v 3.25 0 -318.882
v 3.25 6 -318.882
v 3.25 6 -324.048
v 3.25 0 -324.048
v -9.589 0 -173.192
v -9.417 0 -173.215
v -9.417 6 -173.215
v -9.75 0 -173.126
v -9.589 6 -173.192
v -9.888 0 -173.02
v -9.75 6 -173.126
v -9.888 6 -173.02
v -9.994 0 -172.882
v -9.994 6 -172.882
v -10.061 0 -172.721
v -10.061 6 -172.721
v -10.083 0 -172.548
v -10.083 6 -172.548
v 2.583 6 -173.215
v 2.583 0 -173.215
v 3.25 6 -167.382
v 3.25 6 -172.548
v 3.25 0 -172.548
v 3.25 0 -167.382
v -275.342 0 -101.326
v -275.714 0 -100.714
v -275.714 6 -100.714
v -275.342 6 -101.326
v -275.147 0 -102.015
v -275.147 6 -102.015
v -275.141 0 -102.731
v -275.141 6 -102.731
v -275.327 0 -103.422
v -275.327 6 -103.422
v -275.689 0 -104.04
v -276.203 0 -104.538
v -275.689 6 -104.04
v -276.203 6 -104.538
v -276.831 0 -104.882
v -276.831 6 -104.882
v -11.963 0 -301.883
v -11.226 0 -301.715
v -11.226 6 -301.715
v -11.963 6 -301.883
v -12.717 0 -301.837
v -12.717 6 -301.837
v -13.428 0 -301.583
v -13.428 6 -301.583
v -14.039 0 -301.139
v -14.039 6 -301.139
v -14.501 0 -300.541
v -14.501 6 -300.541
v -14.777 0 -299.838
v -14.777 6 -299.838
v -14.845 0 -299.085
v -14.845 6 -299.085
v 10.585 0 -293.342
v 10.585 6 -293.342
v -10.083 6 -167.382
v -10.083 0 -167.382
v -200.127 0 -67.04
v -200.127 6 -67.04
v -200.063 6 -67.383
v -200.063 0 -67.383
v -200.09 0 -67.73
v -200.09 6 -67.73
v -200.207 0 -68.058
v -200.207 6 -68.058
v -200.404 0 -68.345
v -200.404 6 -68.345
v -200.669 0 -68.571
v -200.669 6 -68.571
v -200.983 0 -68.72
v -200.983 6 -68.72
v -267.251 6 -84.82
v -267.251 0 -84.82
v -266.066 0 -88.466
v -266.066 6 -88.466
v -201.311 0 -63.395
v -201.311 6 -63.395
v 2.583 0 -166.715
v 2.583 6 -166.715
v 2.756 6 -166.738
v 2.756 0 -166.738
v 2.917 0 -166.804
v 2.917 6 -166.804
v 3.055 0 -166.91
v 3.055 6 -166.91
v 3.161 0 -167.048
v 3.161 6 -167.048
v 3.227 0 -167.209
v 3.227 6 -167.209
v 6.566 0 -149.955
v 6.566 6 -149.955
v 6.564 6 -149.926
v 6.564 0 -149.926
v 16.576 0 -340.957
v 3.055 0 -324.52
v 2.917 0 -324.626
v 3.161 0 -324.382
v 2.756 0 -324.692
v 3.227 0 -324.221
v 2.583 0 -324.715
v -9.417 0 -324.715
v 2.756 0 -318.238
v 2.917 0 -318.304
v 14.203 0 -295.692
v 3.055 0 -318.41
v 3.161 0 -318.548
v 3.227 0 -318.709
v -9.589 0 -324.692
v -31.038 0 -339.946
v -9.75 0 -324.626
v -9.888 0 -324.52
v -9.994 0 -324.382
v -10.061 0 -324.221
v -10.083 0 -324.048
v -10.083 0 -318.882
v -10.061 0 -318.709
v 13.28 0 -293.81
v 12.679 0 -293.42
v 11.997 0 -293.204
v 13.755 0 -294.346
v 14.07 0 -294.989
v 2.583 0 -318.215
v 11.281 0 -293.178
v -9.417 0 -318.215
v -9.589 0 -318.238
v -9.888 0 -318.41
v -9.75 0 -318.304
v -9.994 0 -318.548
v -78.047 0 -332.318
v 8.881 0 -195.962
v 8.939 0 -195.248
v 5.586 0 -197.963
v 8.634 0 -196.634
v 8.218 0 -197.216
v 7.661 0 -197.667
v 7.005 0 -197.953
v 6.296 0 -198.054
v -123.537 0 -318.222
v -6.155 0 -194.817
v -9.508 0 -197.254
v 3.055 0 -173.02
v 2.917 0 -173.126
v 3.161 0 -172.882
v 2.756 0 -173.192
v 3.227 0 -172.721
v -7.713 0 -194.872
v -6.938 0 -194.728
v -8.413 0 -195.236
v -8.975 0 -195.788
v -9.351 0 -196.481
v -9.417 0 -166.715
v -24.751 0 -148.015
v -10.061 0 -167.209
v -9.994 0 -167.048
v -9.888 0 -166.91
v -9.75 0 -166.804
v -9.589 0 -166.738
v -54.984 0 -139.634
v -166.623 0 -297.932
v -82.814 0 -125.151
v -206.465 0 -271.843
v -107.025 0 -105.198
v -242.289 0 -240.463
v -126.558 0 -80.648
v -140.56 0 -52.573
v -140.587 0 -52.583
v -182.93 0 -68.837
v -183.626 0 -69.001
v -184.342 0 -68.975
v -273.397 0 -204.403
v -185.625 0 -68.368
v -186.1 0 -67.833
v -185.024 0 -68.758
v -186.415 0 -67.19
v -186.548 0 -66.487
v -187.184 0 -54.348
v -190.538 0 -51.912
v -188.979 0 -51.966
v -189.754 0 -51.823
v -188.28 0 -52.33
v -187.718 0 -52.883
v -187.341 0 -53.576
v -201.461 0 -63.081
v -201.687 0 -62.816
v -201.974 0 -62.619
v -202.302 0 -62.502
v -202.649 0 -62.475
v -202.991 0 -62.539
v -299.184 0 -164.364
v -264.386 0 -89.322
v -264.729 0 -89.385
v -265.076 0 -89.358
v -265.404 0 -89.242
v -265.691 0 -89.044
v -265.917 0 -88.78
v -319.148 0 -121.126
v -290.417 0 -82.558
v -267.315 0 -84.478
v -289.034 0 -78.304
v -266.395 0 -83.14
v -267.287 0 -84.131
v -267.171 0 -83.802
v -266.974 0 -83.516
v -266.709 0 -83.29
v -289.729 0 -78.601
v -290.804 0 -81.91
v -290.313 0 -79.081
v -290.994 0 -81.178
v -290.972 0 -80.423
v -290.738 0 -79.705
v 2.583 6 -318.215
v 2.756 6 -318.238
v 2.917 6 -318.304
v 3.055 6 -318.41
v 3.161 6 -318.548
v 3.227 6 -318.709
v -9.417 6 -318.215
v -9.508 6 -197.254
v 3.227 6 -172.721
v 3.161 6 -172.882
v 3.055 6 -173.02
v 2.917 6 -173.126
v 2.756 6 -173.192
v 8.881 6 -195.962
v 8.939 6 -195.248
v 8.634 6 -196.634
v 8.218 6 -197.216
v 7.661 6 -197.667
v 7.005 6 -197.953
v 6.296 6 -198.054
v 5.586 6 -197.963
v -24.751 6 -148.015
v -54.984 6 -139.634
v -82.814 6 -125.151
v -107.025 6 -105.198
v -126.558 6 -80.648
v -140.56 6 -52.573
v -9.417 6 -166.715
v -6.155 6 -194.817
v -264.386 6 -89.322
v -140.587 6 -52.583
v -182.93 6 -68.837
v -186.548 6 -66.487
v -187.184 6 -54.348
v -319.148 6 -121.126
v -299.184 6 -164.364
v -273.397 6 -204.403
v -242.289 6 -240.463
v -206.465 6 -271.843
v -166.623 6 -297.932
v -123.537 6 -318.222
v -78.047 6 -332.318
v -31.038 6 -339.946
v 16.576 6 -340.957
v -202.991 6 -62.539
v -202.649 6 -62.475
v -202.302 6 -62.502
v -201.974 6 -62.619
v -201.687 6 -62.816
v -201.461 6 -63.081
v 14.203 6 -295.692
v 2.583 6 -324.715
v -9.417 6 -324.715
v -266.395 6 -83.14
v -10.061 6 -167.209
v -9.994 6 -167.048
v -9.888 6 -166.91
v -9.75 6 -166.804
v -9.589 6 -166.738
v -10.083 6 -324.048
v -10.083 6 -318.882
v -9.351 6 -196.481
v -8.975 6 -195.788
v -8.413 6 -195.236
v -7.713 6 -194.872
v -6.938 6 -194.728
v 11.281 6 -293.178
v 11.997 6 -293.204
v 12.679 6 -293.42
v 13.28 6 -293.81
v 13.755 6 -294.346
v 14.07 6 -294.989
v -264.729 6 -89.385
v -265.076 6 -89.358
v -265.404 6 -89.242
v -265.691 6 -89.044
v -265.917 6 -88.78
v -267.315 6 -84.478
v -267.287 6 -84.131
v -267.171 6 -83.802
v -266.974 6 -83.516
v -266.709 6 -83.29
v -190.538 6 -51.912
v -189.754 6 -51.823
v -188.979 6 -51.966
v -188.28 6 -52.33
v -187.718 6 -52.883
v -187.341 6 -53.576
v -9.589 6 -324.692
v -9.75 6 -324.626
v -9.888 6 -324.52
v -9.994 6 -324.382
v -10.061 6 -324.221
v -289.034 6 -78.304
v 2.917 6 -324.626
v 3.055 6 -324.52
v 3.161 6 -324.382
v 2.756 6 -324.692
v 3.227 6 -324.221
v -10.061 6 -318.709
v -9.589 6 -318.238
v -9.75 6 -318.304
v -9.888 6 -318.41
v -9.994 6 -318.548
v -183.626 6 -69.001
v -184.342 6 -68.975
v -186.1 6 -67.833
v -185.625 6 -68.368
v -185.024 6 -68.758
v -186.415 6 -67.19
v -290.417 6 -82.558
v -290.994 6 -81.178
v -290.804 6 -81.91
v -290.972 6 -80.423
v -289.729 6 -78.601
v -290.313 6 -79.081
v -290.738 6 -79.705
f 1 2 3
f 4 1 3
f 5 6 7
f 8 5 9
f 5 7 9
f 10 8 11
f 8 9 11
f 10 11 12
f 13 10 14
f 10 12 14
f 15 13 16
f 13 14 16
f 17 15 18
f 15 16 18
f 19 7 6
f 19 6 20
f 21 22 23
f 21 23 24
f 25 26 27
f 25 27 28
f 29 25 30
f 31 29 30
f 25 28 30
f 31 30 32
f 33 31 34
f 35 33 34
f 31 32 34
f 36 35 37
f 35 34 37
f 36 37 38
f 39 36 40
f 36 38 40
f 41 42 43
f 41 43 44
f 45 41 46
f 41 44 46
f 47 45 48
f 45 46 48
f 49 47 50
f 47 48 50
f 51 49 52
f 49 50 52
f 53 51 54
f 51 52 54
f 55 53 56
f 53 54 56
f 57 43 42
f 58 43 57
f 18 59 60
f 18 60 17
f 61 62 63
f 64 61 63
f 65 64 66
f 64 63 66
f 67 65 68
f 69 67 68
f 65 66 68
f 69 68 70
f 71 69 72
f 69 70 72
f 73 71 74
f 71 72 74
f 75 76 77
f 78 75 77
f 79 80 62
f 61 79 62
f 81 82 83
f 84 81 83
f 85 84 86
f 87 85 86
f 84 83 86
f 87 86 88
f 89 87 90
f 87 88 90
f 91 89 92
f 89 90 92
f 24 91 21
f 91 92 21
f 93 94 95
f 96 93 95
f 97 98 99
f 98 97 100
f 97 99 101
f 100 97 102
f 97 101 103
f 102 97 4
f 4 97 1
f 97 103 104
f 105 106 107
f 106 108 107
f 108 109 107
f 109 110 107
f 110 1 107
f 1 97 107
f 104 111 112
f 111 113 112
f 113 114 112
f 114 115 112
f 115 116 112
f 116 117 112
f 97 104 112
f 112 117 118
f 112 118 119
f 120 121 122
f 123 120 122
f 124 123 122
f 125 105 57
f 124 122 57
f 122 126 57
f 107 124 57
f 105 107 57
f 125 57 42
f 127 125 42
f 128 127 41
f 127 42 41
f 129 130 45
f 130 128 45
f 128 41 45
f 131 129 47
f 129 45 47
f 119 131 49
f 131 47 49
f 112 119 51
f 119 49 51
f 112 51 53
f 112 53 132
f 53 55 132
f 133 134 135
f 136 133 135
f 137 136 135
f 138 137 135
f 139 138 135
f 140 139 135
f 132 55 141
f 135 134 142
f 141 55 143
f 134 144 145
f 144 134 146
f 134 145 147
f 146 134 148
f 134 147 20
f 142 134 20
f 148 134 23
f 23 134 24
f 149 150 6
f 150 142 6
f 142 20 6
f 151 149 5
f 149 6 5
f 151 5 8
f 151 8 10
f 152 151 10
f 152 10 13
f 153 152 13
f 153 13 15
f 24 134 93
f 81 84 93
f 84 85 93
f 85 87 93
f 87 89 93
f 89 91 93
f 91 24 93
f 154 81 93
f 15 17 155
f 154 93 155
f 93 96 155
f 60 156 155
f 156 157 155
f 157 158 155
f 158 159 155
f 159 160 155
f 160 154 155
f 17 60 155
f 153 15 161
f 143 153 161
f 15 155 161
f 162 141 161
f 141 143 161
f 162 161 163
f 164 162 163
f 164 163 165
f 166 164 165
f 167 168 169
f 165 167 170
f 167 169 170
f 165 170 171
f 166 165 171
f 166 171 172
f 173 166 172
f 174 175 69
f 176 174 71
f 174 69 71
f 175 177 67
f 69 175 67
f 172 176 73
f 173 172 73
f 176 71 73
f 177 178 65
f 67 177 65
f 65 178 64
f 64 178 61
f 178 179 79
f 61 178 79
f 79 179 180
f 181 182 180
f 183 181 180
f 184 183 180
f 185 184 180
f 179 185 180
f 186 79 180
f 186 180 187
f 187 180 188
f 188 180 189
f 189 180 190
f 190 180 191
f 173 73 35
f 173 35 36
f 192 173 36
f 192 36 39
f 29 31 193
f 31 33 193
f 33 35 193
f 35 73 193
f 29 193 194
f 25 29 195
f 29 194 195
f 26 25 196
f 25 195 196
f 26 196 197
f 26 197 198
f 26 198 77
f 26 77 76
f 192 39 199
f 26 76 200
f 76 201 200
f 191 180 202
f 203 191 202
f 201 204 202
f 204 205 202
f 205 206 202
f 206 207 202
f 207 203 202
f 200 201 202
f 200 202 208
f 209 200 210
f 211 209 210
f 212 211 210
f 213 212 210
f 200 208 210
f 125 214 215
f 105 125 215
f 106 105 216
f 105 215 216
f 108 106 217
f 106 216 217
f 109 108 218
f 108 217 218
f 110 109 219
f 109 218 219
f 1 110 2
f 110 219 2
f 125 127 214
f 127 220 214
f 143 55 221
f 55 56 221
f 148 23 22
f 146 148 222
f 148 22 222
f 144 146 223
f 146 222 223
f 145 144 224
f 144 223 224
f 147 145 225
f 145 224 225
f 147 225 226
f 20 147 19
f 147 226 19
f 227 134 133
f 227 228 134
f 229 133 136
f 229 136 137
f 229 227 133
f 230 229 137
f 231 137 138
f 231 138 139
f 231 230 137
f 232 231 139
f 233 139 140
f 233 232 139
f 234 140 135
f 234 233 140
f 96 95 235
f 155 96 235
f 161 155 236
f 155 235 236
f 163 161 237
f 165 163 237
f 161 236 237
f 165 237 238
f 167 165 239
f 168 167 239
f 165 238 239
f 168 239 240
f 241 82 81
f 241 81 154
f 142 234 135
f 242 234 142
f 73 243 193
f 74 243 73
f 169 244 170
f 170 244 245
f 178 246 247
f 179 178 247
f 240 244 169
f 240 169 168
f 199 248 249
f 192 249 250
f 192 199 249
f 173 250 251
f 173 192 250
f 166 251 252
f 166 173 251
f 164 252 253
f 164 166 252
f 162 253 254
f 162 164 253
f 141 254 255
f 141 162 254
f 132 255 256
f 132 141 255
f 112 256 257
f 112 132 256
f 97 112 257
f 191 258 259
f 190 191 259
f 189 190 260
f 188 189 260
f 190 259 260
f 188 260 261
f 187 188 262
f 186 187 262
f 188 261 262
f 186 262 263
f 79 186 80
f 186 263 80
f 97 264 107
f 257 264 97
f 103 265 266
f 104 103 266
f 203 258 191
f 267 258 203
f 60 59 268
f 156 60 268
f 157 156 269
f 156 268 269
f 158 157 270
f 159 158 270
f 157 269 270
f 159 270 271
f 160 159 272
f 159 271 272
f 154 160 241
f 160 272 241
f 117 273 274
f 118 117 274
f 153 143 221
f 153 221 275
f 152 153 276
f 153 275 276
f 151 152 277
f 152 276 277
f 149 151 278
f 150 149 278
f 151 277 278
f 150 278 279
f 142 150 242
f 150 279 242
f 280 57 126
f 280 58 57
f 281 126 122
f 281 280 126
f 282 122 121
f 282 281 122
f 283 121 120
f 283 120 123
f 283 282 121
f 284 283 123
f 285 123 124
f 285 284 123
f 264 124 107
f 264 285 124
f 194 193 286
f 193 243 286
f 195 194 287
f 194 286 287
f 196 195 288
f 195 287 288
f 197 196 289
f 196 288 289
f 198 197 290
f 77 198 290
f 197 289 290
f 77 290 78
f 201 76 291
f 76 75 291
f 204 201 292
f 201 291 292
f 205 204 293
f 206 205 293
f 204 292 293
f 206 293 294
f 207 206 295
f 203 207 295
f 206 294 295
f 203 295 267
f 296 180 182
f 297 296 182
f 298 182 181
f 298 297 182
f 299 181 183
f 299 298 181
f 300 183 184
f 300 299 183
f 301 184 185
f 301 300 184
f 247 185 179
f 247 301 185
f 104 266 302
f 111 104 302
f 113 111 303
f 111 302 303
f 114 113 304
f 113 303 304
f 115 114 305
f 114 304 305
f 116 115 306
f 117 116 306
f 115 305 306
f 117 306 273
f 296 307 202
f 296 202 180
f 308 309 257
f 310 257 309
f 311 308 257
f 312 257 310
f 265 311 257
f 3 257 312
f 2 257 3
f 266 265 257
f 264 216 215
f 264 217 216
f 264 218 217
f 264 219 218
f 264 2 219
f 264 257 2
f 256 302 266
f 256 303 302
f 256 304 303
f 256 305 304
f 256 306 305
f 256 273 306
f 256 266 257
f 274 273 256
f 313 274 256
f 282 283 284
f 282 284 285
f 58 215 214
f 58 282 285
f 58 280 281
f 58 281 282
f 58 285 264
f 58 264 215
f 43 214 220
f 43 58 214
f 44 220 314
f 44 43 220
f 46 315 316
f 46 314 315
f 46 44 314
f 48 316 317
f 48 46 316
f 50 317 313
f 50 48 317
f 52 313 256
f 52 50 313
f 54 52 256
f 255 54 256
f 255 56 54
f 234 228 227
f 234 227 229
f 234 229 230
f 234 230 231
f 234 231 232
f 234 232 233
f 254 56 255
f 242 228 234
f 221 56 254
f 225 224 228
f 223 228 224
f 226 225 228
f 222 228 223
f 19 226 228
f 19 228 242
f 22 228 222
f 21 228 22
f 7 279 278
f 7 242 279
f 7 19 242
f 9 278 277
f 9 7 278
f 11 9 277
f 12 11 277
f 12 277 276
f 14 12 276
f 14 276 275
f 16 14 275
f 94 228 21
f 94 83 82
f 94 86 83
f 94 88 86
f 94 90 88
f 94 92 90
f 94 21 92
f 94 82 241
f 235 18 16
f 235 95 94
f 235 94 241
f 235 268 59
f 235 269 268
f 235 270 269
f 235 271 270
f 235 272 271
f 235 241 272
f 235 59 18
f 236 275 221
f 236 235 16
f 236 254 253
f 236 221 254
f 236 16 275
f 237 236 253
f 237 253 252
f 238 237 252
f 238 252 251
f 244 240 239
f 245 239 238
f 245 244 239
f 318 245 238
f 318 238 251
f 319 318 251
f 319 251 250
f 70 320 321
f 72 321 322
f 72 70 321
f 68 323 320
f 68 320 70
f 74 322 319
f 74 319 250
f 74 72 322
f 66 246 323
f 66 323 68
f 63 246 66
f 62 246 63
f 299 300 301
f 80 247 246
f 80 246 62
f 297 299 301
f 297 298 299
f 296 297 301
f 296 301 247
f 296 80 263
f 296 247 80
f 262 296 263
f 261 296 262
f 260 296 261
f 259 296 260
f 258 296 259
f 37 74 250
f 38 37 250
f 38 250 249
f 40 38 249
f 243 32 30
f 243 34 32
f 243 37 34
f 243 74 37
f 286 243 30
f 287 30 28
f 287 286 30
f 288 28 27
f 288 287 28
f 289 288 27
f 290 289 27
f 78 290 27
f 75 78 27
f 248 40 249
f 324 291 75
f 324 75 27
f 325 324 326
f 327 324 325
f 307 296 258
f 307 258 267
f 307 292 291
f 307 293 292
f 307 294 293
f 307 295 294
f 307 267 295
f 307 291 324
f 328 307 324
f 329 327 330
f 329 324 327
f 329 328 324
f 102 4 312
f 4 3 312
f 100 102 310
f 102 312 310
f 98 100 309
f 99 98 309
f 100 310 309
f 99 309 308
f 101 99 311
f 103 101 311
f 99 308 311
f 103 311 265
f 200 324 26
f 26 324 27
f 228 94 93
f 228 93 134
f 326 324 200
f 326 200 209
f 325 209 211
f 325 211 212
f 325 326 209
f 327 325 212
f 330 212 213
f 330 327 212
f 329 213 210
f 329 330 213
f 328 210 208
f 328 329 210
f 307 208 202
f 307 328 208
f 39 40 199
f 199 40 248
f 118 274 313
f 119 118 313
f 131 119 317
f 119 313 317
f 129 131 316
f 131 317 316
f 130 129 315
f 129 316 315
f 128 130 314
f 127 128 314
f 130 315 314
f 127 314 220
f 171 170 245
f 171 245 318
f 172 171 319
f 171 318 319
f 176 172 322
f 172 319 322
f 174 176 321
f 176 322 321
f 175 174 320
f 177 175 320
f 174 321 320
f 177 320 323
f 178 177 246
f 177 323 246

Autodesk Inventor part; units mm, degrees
ref_plane "YZ Plane" through (0, 0, 0) normal (1, 0, 0) x (0, 1, 0)
ref_plane "XZ Plane" through (0, 0, 0) normal (0, 1, 0) x (-1, 0, 0)
sketch "Sketch1" plane through (0, 0, 0) normal (0, 1, 0) x (-1, 0, 0)
  circle A0 centre (0, 0) radius 341.36
  circle A1 centre (0, 0) radius 150.07
  dimension "d84" = 300.14
  dimension "d85" = 682.72
extrude "Extrusion3" add sketch "Sketch1" along normal blind 6 contours A0 | A1
sketch "Sketch2" plane through (0, 6, 0) normal (0, 1, 0) x (1, 0, 0)
  circle A0 centre (0, 0) radius 245.715 construction
  line L0 (245.7148, 0.3131) -> (341.6521, -0.0088)
  line L1 (-0.6289, 279.0483) -> (-0.0524, 279.0483)
  line L2 (3.25, 279.0483) -> (3.25, 212.3817)
  line L3 (0.5377, 212.3817) -> (-0.051, 212.3817)
  line L4 (-3.25, 212.3817) -> (-3.25, 279.0483)
  arc A1 (-3.25, 212.3817) -> (-1.9167, 211.0483) centre (-1.9167, 212.3817) ccw
  arc A2 (1.9167, 211.0483) -> (3.25, 212.3817) centre (1.9167, 212.3817) ccw
  arc A3 (-1.9167, 280.3817) -> (-3.25, 279.0483) centre (-1.9167, 279.0483) ccw
  arc A4 (3.25, 279.0483) -> (1.9167, 280.3817) centre (1.9167, 279.0483) ccw
  line L5 (-1.9167, 280.3817) -> (1.9167, 280.3817)
  line L6 (-1.9167, 211.0483) -> (1.9167, 211.0483)
  line L7 (0, 0) -> (0, 212.3817)
  line L8 (0, 280.3817) -> (0, 341.36)
  line L9 (0, 211.0483) -> (0, 245.715) construction
  line L10 (0, 280.3817) -> (0, 245.715) construction
  line L11 (-265.5851, 85.6325) -> (-265.4069, 86.1808)
  line L12 (-267.2511, 84.8198) -> (-266.0665, 88.4656)
  line L13 (-201.3112, 63.3947) -> (-200.1266, 67.0404)
  arc A5 (-267.2511, 84.8198) -> (-266.395, 83.1397) centre (-265.983, 84.4078) ccw
  arc A6 (-264.3864, 89.3216) -> (-266.0665, 88.4656) centre (-264.7985, 88.0535) ccw
  line L14 (-266.6588, 86.6427) -> (-233.6889, 75.9301) construction
  line L15 (-202.9913, 62.5386) -> (-266.395, 83.1397)
  line L16 (-264.3864, 89.3216) -> (-200.9827, 68.7205)
  line L17 (-200.7189, 65.2175) -> (-233.6889, 75.9301) construction
  arc A7 (-202.9913, 62.5386) -> (-201.3112, 63.3947) centre (-202.5793, 63.8067) ccw
  arc A8 (-200.1266, 67.0404) -> (-200.9827, 68.7205) centre (-201.3947, 67.4524) ccw
  line L18 (-201.8208, 66.141) -> (-202.0027, 65.5811)
  line L19 (-163.5117, -226.1245) -> (-163.9781, -225.7857)
  line L20 (-163.2536, -227.9601) -> (-166.3548, -225.7069)
  line L21 (-122.5005, -171.8683) -> (-125.6017, -169.6151)
  arc A9 (-163.2536, -227.9601) -> (-161.3912, -227.6651) centre (-162.4699, -226.8814) ccw
  arc A10 (-166.6498, -223.8445) -> (-166.3548, -225.7069) centre (-165.5711, -224.6283) ccw
  line L22 (-164.8042, -226.8335) -> (-144.4277, -198.7876) construction
  line L23 (-122.2055, -173.7307) -> (-161.3912, -227.6651)
  line L24 (-166.6498, -223.8445) -> (-127.4641, -169.9101)
  line L25 (-124.0511, -170.7417) -> (-144.4277, -198.7876) construction
  arc A11 (-122.2055, -173.7307) -> (-122.5005, -171.8683) centre (-123.2842, -172.947) ccw
  arc A12 (-125.6017, -169.6151) -> (-127.4641, -169.9101) centre (-126.3854, -170.6938) ccw
  line L26 (-125.2699, -171.5043) -> (-124.7936, -171.8503)
  line L27 (164.5293, -225.3852) -> (164.0629, -225.724)
  line L28 (166.3548, -225.7069) -> (163.2536, -227.9601)
  line L29 (125.6017, -169.6151) -> (122.5005, -171.8683)
  arc A13 (166.3548, -225.7069) -> (166.6498, -223.8445) centre (165.5711, -224.6283) ccw
  arc A14 (161.3912, -227.6651) -> (163.2536, -227.9601) centre (162.4699, -226.8814) ccw
  line L30 (164.8042, -226.8335) -> (144.4277, -198.7876) construction
  line L31 (127.4641, -169.9101) -> (166.6498, -223.8445)
  line L32 (161.3912, -227.6651) -> (122.2055, -173.7307)
  line L33 (124.0511, -170.7417) -> (144.4277, -198.7876) construction
  arc A15 (127.4641, -169.9101) -> (125.6017, -169.6151) centre (126.3854, -170.6938) ccw
  arc A16 (122.5005, -171.8683) -> (122.2055, -173.7307) centre (123.2842, -172.947) ccw
  line L34 (124.3998, -172.1365) -> (124.8761, -171.7904)
  line L35 (265.1964, 86.8288) -> (265.3745, 86.2805)
  line L36 (266.0665, 88.4656) -> (267.2511, 84.8198)
  line L37 (200.1266, 67.0404) -> (201.3112, 63.3947)
  arc A17 (266.0665, 88.4656) -> (264.3864, 89.3216) centre (264.7985, 88.0535) ccw
  arc A18 (266.395, 83.1397) -> (267.2511, 84.8198) centre (265.983, 84.4078) ccw
  line L38 (266.6588, 86.6427) -> (233.6889, 75.9301) construction
  line L39 (200.9827, 68.7205) -> (264.3864, 89.3216)
  line L40 (266.395, 83.1397) -> (202.9913, 62.5386)
  line L41 (200.7189, 65.2175) -> (233.6889, 75.9301) construction
  arc A19 (200.9827, 68.7205) -> (200.1266, 67.0404) centre (201.3947, 67.4524) ccw
  arc A20 (201.3112, 63.3947) -> (202.9913, 62.5386) centre (202.5793, 63.8067) ccw
  line L42 (202.1531, 65.1181) -> (201.9712, 65.678)
  point P0 (-201.987, 65.6295)
  point P1 (-124.8348, -171.8204)
  point P2 (124.8348, -171.8204)
  point P3 (201.987, 65.6295)
  dimension "d21" = 6.5
  dimension "d23" = 66.6667
  dimension "d24" = 2.6667
  dimension "d25" = 2.6667
  dimension "d32" = 1.3333
  dimension "d33" = 1.3333
  dimension "d41" = 90
  dimension "d42" = 3.25
  dimension "d43" = 90
  dimension "d49" = 360
  dimension "d86" = 491.43
extrude "Extrusion4" cut sketch "Sketch2" against normal through all
sketch "Sketch3" plane through (0, 6, 0) normal (0, 1, 0) x (1, 0, 0)
  arc A0 (-115.2299, -321.3234) -> (115.2355, -321.3214) centre (0, 0) ccw
  arc A1 (-77.7244, -128.3741) -> (77.7297, -128.3709) centre (0, 0) ccw
  line L0 (-122.1811, -173.696) -> (-161.3589, -227.6196)
  line L1 (-115.2299, -321.3234) -> (-77.7244, -128.3741)
  line L2 (0, 0) -> (0, -341.2918)
  line L3 (115.2355, -321.3214) -> (77.7297, -128.3709)
  line L4 (161.3912, -227.6651) -> (122.2055, -173.7307) projected
  dimension "d52" = 25
  dimension "d87" = 150.07
  dimension "d88" = 341.36
  dimension "d89" = 25
  dimension "d90" = 11
  dimension "d91" = 11
extrude "Extrusion5" cut sketch "Sketch3" against normal blind 10
sketch "Sketch5" plane through (0, 6, 0) normal (0, 1, 0) x (1, 0, 0)
  line L0 (3.25, 279.0483) -> (3.25, 212.3817) projected
  line L1 (5.5862, 197.9634) -> (-6.155, 194.8174)
  line L2 (-11.2263, 301.7146) -> (10.5847, 293.3421)
  line L3 (6.5657, 149.9554) -> (8.9394, 195.248)
  line L4 (14.2034, 295.6921) -> (16.5771, 340.9846)
  arc A0 (10.5847, 293.3421) -> (14.2034, 295.6921) centre (11.5404, 295.8316) ccw
  arc A1 (8.9394, 195.248) -> (5.5862, 197.9634) centre (6.2763, 195.3876) ccw
  arc A2 (-11.2263, 301.7146) -> (-14.8449, 299.0854) centre (-12.1819, 299.225) ccw
  line L5 (-3.25, 212.3817) -> (-3.25, 279.0483) projected
  line L6 (-14.8449, 299.0854) -> (-9.5081, 197.2536)
  arc A3 (-9.5081, 197.2536) -> (-6.155, 194.8174) centre (-6.8451, 197.3932) ccw
  line L7 (-1.9167, 211.0483) -> (1.9167, 211.0483) projected
  line L8 (1.9167, 280.3817) -> (-1.9167, 280.3817) projected
  arc A4 (115.2355, -321.3214) -> (-115.2299, -321.3234) centre (0, 0) ccw
  line L9 (16.5771, 340.9846) -> (16.5774, 340.9903)
  arc A5 (-190.5375, 51.9119) -> (-187.1843, 54.3482) centre (-189.8473, 54.4877) ccw
  line L10 (-186.5481, 66.4868) -> (-187.1843, 54.3482)
  arc A6 (-182.9295, 68.8368) -> (-186.5481, 66.4868) centre (-183.8851, 66.3472) ccw
  arc A7 (-275.714, 100.7144) -> (-276.8308, 104.8821) centre (-277.7864, 102.3926) ccw
  line L11 (-289.0345, 78.3041) -> (-190.5375, 51.9119)
  arc A8 (-290.4167, 82.5581) -> (-289.0345, 78.3041) centre (-288.3443, 80.8799) ccw
  line L12 (-290.4167, 82.5581) -> (-275.714, 100.7144)
  line L13 (-276.8308, 104.8821) -> (-319.1731, 121.1358)
  line L14 (-140.5872, 52.5831) -> (-182.9295, 68.8368)
  line L15 (-319.1731, 121.1358) -> (-319.1784, 121.1378)
  arc A9 (184.6611, 69.9975) -> (183.3803, 66.0556) centre (185.6168, 67.508) ccw
  line L16 (190.0006, 55.8613) -> (183.3803, 66.0556)
  arc A10 (188.4543, 51.8331) -> (190.0006, 55.8613) centre (187.7641, 54.4089) ccw
  arc A11 (282.2558, 80.581) -> (285.609, 77.8656) centre (284.9188, 80.4414) ccw
  line L17 (279.8598, 106.5409) -> (184.6611, 69.9975)
  arc A12 (283.4785, 103.9117) -> (279.8598, 106.5409) centre (280.8155, 104.0513) ccw
  line L18 (283.4785, 103.9117) -> (282.2558, 80.581)
  line L19 (285.609, 77.8656) -> (329.4183, 89.6043)
  line L20 (144.645, 40.0945) -> (188.4543, 51.8331)
  line L21 (329.4183, 89.6043) -> (329.4238, 89.6058)
  circle A13 centre (0, 0) radius 150.07
  line L22 (-140.5872, 52.5831) -> (-140.5479, 52.568)
  line L23 (144.645, 40.0945) -> (144.5122, 40.0589)
  line L24 (6.5657, 149.9554) -> (6.5621, 149.8874)
  arc A14 (-77.7244, -128.3741) -> (77.7297, -128.3709) centre (0, 0) ccw projected
  arc A15 (115.2355, -321.3214) -> (-115.2299, -321.3234) centre (0, 0) ccw projected
  line L25 (77.7297, -128.3709) -> (115.2355, -321.3214)
  line L26 (-77.7244, -128.3741) -> (-115.2299, -321.3234)
  point P0 (-77.7399, -128.3998)
  point P1 (77.7399, -128.3998)
  point P2 (-319.1475, 121.126)
  point P3 (-140.56, 52.5727)
  point P4 (6.5642, 149.9264)
  point P5 (16.5757, 340.9573)
  point P6 (329.3918, 89.5972)
  point P7 (144.6169, 40.0869)
  dimension "d63" = 2.6667
  dimension "d64" = 3
  dimension "d66" = 3
  dimension "d67" = 2.6667
  dimension "d68" = 2.6667
  dimension "d70" = 72
  dimension "d71" = 72
  dimension "d94" = 300.14
  dimension "d95" = 682.72
sketch "Sketch6" plane through (0, 6, 0) normal (0, 1, 0) x (1, 0, 0)
  line L0 (188.7727, -264.2184) -> (198.4809, -257.165)
  line L1 (194.6603, -251.9064) -> (184.9521, -258.9598)
  line L2 (161.3912, -227.6651) -> (122.2055, -173.7307) projected
  line L3 (166.3548, -225.7069) -> (163.2536, -227.9601) projected
  arc A0 (195.5915, -252.0539) -> (194.6603, -251.9064) centre (195.0522, -252.4457) ccw
  arc A1 (198.4809, -257.165) -> (198.6284, -256.2338) centre (198.0891, -256.6256) ccw
  arc A2 (187.8415, -264.0709) -> (188.7727, -264.2184) centre (188.3809, -263.6791) ccw
  arc A3 (184.9521, -258.9598) -> (184.8046, -259.891) centre (185.344, -259.4991) ccw
  line L4 (184.8046, -259.891) -> (187.8415, -264.0709)
  line L5 (198.6284, -256.2338) -> (195.5915, -252.0539)
  line L6 (122.2055, -173.7307) -> (161.3912, -227.6651) projected
  line L7 (141.7983, -200.6979) -> (147.057, -196.8773)
  line L8 (166.6498, -223.8445) -> (127.4641, -169.9101) projected
  line L9 (95.9027, -136.3937) -> (105.6109, -129.3403)
  line L10 (109.4315, -134.5989) -> (99.7233, -141.6523)
  arc A4 (109.4315, -134.5989) -> (109.579, -133.6677) centre (109.0396, -134.0596) ccw
  arc A5 (106.5421, -129.4878) -> (105.6109, -129.3403) centre (106.0027, -129.8796) ccw
  arc A6 (95.9027, -136.3937) -> (95.7552, -137.3249) centre (96.2945, -136.9331) ccw
  arc A7 (98.7921, -141.5048) -> (99.7233, -141.6523) centre (99.3314, -141.113) ccw
  line L11 (98.7921, -141.5048) -> (95.7552, -137.3249)
  line L12 (106.5421, -129.4878) -> (109.579, -133.6677)
  point P0 (0, 0)
  dimension "d104" = 6.5
  dimension "d105" = 12
  dimension "d108" = 1.3333
  dimension "d109" = 1.3333
  dimension "d110" = 1.3333
  dimension "d111" = 1.3333
  dimension "d112" = 0
  dimension "d149" = 145
  dimension "d150" = 90
  dimension "d151" = 90
  dimension "d152" = 90
  dimension "d153" = 90
extrude "Extrusion7" cut sketch "Sketch6" against normal through all
ref_plane "Work Plane1" through (265.3907, 0, -86.2307) normal (0.309, 0, 0.9511) x (0.9511, 0, -0.309)
pattern_circular "Circular Pattern2" count 2 over 72 about axis through (0, -10, 0) along (0, 1, 0) of "Extrusion7"
pattern_circular "Circular Pattern3" count 2 over 144 about axis through (0, -10, 0) along (0, 1, 0) of "Extrusion7"
mirror "Mirror3" about plane through (0, 0, 0) normal (1, 0, 0) of "Extrusion7"
pattern_circular "Circular Pattern4" count 2 over 144 about axis through (0, -10, 0) along (0, -1, 0) of "Extrusion7"
extrude "Extrusion10" cut sketch "Sketch5" against normal through all contours L1 A3 L6 A2 L2 A0 L4 A4 L19 A11 L18 A12 L17 A9 L16 A10 L20 L23 A13 L24 L3 A1 | A13 | L23 L20 A10 L16 A9 L17 A12 L18 A11 L19 A4 L25 A13 | A13 L26 A4 L13 A7 L12 A8 L11 A5 L10 A6 L14 L22
equation "\"BendRadius\" = Thickness"
equation "\"BendReliefWidth\" = Thickness"
equation "\"BendReliefDepth\" = 0.5 * Thickness"
equation "\"CornerReliefSize\" = 4 * Thickness"
equation "\"MinimumRemnant\" = 2 * Thickness"
equation "\"TransitionRadius\" = BendRadius"
equation "\"JacobiRadiusSize\" = BendRadius"
equation "\"GapSize\" = Thickness"
equation "\"Thickness\" = 0.5"
properties part number "Ring D2" material "Wood (Maple)"
